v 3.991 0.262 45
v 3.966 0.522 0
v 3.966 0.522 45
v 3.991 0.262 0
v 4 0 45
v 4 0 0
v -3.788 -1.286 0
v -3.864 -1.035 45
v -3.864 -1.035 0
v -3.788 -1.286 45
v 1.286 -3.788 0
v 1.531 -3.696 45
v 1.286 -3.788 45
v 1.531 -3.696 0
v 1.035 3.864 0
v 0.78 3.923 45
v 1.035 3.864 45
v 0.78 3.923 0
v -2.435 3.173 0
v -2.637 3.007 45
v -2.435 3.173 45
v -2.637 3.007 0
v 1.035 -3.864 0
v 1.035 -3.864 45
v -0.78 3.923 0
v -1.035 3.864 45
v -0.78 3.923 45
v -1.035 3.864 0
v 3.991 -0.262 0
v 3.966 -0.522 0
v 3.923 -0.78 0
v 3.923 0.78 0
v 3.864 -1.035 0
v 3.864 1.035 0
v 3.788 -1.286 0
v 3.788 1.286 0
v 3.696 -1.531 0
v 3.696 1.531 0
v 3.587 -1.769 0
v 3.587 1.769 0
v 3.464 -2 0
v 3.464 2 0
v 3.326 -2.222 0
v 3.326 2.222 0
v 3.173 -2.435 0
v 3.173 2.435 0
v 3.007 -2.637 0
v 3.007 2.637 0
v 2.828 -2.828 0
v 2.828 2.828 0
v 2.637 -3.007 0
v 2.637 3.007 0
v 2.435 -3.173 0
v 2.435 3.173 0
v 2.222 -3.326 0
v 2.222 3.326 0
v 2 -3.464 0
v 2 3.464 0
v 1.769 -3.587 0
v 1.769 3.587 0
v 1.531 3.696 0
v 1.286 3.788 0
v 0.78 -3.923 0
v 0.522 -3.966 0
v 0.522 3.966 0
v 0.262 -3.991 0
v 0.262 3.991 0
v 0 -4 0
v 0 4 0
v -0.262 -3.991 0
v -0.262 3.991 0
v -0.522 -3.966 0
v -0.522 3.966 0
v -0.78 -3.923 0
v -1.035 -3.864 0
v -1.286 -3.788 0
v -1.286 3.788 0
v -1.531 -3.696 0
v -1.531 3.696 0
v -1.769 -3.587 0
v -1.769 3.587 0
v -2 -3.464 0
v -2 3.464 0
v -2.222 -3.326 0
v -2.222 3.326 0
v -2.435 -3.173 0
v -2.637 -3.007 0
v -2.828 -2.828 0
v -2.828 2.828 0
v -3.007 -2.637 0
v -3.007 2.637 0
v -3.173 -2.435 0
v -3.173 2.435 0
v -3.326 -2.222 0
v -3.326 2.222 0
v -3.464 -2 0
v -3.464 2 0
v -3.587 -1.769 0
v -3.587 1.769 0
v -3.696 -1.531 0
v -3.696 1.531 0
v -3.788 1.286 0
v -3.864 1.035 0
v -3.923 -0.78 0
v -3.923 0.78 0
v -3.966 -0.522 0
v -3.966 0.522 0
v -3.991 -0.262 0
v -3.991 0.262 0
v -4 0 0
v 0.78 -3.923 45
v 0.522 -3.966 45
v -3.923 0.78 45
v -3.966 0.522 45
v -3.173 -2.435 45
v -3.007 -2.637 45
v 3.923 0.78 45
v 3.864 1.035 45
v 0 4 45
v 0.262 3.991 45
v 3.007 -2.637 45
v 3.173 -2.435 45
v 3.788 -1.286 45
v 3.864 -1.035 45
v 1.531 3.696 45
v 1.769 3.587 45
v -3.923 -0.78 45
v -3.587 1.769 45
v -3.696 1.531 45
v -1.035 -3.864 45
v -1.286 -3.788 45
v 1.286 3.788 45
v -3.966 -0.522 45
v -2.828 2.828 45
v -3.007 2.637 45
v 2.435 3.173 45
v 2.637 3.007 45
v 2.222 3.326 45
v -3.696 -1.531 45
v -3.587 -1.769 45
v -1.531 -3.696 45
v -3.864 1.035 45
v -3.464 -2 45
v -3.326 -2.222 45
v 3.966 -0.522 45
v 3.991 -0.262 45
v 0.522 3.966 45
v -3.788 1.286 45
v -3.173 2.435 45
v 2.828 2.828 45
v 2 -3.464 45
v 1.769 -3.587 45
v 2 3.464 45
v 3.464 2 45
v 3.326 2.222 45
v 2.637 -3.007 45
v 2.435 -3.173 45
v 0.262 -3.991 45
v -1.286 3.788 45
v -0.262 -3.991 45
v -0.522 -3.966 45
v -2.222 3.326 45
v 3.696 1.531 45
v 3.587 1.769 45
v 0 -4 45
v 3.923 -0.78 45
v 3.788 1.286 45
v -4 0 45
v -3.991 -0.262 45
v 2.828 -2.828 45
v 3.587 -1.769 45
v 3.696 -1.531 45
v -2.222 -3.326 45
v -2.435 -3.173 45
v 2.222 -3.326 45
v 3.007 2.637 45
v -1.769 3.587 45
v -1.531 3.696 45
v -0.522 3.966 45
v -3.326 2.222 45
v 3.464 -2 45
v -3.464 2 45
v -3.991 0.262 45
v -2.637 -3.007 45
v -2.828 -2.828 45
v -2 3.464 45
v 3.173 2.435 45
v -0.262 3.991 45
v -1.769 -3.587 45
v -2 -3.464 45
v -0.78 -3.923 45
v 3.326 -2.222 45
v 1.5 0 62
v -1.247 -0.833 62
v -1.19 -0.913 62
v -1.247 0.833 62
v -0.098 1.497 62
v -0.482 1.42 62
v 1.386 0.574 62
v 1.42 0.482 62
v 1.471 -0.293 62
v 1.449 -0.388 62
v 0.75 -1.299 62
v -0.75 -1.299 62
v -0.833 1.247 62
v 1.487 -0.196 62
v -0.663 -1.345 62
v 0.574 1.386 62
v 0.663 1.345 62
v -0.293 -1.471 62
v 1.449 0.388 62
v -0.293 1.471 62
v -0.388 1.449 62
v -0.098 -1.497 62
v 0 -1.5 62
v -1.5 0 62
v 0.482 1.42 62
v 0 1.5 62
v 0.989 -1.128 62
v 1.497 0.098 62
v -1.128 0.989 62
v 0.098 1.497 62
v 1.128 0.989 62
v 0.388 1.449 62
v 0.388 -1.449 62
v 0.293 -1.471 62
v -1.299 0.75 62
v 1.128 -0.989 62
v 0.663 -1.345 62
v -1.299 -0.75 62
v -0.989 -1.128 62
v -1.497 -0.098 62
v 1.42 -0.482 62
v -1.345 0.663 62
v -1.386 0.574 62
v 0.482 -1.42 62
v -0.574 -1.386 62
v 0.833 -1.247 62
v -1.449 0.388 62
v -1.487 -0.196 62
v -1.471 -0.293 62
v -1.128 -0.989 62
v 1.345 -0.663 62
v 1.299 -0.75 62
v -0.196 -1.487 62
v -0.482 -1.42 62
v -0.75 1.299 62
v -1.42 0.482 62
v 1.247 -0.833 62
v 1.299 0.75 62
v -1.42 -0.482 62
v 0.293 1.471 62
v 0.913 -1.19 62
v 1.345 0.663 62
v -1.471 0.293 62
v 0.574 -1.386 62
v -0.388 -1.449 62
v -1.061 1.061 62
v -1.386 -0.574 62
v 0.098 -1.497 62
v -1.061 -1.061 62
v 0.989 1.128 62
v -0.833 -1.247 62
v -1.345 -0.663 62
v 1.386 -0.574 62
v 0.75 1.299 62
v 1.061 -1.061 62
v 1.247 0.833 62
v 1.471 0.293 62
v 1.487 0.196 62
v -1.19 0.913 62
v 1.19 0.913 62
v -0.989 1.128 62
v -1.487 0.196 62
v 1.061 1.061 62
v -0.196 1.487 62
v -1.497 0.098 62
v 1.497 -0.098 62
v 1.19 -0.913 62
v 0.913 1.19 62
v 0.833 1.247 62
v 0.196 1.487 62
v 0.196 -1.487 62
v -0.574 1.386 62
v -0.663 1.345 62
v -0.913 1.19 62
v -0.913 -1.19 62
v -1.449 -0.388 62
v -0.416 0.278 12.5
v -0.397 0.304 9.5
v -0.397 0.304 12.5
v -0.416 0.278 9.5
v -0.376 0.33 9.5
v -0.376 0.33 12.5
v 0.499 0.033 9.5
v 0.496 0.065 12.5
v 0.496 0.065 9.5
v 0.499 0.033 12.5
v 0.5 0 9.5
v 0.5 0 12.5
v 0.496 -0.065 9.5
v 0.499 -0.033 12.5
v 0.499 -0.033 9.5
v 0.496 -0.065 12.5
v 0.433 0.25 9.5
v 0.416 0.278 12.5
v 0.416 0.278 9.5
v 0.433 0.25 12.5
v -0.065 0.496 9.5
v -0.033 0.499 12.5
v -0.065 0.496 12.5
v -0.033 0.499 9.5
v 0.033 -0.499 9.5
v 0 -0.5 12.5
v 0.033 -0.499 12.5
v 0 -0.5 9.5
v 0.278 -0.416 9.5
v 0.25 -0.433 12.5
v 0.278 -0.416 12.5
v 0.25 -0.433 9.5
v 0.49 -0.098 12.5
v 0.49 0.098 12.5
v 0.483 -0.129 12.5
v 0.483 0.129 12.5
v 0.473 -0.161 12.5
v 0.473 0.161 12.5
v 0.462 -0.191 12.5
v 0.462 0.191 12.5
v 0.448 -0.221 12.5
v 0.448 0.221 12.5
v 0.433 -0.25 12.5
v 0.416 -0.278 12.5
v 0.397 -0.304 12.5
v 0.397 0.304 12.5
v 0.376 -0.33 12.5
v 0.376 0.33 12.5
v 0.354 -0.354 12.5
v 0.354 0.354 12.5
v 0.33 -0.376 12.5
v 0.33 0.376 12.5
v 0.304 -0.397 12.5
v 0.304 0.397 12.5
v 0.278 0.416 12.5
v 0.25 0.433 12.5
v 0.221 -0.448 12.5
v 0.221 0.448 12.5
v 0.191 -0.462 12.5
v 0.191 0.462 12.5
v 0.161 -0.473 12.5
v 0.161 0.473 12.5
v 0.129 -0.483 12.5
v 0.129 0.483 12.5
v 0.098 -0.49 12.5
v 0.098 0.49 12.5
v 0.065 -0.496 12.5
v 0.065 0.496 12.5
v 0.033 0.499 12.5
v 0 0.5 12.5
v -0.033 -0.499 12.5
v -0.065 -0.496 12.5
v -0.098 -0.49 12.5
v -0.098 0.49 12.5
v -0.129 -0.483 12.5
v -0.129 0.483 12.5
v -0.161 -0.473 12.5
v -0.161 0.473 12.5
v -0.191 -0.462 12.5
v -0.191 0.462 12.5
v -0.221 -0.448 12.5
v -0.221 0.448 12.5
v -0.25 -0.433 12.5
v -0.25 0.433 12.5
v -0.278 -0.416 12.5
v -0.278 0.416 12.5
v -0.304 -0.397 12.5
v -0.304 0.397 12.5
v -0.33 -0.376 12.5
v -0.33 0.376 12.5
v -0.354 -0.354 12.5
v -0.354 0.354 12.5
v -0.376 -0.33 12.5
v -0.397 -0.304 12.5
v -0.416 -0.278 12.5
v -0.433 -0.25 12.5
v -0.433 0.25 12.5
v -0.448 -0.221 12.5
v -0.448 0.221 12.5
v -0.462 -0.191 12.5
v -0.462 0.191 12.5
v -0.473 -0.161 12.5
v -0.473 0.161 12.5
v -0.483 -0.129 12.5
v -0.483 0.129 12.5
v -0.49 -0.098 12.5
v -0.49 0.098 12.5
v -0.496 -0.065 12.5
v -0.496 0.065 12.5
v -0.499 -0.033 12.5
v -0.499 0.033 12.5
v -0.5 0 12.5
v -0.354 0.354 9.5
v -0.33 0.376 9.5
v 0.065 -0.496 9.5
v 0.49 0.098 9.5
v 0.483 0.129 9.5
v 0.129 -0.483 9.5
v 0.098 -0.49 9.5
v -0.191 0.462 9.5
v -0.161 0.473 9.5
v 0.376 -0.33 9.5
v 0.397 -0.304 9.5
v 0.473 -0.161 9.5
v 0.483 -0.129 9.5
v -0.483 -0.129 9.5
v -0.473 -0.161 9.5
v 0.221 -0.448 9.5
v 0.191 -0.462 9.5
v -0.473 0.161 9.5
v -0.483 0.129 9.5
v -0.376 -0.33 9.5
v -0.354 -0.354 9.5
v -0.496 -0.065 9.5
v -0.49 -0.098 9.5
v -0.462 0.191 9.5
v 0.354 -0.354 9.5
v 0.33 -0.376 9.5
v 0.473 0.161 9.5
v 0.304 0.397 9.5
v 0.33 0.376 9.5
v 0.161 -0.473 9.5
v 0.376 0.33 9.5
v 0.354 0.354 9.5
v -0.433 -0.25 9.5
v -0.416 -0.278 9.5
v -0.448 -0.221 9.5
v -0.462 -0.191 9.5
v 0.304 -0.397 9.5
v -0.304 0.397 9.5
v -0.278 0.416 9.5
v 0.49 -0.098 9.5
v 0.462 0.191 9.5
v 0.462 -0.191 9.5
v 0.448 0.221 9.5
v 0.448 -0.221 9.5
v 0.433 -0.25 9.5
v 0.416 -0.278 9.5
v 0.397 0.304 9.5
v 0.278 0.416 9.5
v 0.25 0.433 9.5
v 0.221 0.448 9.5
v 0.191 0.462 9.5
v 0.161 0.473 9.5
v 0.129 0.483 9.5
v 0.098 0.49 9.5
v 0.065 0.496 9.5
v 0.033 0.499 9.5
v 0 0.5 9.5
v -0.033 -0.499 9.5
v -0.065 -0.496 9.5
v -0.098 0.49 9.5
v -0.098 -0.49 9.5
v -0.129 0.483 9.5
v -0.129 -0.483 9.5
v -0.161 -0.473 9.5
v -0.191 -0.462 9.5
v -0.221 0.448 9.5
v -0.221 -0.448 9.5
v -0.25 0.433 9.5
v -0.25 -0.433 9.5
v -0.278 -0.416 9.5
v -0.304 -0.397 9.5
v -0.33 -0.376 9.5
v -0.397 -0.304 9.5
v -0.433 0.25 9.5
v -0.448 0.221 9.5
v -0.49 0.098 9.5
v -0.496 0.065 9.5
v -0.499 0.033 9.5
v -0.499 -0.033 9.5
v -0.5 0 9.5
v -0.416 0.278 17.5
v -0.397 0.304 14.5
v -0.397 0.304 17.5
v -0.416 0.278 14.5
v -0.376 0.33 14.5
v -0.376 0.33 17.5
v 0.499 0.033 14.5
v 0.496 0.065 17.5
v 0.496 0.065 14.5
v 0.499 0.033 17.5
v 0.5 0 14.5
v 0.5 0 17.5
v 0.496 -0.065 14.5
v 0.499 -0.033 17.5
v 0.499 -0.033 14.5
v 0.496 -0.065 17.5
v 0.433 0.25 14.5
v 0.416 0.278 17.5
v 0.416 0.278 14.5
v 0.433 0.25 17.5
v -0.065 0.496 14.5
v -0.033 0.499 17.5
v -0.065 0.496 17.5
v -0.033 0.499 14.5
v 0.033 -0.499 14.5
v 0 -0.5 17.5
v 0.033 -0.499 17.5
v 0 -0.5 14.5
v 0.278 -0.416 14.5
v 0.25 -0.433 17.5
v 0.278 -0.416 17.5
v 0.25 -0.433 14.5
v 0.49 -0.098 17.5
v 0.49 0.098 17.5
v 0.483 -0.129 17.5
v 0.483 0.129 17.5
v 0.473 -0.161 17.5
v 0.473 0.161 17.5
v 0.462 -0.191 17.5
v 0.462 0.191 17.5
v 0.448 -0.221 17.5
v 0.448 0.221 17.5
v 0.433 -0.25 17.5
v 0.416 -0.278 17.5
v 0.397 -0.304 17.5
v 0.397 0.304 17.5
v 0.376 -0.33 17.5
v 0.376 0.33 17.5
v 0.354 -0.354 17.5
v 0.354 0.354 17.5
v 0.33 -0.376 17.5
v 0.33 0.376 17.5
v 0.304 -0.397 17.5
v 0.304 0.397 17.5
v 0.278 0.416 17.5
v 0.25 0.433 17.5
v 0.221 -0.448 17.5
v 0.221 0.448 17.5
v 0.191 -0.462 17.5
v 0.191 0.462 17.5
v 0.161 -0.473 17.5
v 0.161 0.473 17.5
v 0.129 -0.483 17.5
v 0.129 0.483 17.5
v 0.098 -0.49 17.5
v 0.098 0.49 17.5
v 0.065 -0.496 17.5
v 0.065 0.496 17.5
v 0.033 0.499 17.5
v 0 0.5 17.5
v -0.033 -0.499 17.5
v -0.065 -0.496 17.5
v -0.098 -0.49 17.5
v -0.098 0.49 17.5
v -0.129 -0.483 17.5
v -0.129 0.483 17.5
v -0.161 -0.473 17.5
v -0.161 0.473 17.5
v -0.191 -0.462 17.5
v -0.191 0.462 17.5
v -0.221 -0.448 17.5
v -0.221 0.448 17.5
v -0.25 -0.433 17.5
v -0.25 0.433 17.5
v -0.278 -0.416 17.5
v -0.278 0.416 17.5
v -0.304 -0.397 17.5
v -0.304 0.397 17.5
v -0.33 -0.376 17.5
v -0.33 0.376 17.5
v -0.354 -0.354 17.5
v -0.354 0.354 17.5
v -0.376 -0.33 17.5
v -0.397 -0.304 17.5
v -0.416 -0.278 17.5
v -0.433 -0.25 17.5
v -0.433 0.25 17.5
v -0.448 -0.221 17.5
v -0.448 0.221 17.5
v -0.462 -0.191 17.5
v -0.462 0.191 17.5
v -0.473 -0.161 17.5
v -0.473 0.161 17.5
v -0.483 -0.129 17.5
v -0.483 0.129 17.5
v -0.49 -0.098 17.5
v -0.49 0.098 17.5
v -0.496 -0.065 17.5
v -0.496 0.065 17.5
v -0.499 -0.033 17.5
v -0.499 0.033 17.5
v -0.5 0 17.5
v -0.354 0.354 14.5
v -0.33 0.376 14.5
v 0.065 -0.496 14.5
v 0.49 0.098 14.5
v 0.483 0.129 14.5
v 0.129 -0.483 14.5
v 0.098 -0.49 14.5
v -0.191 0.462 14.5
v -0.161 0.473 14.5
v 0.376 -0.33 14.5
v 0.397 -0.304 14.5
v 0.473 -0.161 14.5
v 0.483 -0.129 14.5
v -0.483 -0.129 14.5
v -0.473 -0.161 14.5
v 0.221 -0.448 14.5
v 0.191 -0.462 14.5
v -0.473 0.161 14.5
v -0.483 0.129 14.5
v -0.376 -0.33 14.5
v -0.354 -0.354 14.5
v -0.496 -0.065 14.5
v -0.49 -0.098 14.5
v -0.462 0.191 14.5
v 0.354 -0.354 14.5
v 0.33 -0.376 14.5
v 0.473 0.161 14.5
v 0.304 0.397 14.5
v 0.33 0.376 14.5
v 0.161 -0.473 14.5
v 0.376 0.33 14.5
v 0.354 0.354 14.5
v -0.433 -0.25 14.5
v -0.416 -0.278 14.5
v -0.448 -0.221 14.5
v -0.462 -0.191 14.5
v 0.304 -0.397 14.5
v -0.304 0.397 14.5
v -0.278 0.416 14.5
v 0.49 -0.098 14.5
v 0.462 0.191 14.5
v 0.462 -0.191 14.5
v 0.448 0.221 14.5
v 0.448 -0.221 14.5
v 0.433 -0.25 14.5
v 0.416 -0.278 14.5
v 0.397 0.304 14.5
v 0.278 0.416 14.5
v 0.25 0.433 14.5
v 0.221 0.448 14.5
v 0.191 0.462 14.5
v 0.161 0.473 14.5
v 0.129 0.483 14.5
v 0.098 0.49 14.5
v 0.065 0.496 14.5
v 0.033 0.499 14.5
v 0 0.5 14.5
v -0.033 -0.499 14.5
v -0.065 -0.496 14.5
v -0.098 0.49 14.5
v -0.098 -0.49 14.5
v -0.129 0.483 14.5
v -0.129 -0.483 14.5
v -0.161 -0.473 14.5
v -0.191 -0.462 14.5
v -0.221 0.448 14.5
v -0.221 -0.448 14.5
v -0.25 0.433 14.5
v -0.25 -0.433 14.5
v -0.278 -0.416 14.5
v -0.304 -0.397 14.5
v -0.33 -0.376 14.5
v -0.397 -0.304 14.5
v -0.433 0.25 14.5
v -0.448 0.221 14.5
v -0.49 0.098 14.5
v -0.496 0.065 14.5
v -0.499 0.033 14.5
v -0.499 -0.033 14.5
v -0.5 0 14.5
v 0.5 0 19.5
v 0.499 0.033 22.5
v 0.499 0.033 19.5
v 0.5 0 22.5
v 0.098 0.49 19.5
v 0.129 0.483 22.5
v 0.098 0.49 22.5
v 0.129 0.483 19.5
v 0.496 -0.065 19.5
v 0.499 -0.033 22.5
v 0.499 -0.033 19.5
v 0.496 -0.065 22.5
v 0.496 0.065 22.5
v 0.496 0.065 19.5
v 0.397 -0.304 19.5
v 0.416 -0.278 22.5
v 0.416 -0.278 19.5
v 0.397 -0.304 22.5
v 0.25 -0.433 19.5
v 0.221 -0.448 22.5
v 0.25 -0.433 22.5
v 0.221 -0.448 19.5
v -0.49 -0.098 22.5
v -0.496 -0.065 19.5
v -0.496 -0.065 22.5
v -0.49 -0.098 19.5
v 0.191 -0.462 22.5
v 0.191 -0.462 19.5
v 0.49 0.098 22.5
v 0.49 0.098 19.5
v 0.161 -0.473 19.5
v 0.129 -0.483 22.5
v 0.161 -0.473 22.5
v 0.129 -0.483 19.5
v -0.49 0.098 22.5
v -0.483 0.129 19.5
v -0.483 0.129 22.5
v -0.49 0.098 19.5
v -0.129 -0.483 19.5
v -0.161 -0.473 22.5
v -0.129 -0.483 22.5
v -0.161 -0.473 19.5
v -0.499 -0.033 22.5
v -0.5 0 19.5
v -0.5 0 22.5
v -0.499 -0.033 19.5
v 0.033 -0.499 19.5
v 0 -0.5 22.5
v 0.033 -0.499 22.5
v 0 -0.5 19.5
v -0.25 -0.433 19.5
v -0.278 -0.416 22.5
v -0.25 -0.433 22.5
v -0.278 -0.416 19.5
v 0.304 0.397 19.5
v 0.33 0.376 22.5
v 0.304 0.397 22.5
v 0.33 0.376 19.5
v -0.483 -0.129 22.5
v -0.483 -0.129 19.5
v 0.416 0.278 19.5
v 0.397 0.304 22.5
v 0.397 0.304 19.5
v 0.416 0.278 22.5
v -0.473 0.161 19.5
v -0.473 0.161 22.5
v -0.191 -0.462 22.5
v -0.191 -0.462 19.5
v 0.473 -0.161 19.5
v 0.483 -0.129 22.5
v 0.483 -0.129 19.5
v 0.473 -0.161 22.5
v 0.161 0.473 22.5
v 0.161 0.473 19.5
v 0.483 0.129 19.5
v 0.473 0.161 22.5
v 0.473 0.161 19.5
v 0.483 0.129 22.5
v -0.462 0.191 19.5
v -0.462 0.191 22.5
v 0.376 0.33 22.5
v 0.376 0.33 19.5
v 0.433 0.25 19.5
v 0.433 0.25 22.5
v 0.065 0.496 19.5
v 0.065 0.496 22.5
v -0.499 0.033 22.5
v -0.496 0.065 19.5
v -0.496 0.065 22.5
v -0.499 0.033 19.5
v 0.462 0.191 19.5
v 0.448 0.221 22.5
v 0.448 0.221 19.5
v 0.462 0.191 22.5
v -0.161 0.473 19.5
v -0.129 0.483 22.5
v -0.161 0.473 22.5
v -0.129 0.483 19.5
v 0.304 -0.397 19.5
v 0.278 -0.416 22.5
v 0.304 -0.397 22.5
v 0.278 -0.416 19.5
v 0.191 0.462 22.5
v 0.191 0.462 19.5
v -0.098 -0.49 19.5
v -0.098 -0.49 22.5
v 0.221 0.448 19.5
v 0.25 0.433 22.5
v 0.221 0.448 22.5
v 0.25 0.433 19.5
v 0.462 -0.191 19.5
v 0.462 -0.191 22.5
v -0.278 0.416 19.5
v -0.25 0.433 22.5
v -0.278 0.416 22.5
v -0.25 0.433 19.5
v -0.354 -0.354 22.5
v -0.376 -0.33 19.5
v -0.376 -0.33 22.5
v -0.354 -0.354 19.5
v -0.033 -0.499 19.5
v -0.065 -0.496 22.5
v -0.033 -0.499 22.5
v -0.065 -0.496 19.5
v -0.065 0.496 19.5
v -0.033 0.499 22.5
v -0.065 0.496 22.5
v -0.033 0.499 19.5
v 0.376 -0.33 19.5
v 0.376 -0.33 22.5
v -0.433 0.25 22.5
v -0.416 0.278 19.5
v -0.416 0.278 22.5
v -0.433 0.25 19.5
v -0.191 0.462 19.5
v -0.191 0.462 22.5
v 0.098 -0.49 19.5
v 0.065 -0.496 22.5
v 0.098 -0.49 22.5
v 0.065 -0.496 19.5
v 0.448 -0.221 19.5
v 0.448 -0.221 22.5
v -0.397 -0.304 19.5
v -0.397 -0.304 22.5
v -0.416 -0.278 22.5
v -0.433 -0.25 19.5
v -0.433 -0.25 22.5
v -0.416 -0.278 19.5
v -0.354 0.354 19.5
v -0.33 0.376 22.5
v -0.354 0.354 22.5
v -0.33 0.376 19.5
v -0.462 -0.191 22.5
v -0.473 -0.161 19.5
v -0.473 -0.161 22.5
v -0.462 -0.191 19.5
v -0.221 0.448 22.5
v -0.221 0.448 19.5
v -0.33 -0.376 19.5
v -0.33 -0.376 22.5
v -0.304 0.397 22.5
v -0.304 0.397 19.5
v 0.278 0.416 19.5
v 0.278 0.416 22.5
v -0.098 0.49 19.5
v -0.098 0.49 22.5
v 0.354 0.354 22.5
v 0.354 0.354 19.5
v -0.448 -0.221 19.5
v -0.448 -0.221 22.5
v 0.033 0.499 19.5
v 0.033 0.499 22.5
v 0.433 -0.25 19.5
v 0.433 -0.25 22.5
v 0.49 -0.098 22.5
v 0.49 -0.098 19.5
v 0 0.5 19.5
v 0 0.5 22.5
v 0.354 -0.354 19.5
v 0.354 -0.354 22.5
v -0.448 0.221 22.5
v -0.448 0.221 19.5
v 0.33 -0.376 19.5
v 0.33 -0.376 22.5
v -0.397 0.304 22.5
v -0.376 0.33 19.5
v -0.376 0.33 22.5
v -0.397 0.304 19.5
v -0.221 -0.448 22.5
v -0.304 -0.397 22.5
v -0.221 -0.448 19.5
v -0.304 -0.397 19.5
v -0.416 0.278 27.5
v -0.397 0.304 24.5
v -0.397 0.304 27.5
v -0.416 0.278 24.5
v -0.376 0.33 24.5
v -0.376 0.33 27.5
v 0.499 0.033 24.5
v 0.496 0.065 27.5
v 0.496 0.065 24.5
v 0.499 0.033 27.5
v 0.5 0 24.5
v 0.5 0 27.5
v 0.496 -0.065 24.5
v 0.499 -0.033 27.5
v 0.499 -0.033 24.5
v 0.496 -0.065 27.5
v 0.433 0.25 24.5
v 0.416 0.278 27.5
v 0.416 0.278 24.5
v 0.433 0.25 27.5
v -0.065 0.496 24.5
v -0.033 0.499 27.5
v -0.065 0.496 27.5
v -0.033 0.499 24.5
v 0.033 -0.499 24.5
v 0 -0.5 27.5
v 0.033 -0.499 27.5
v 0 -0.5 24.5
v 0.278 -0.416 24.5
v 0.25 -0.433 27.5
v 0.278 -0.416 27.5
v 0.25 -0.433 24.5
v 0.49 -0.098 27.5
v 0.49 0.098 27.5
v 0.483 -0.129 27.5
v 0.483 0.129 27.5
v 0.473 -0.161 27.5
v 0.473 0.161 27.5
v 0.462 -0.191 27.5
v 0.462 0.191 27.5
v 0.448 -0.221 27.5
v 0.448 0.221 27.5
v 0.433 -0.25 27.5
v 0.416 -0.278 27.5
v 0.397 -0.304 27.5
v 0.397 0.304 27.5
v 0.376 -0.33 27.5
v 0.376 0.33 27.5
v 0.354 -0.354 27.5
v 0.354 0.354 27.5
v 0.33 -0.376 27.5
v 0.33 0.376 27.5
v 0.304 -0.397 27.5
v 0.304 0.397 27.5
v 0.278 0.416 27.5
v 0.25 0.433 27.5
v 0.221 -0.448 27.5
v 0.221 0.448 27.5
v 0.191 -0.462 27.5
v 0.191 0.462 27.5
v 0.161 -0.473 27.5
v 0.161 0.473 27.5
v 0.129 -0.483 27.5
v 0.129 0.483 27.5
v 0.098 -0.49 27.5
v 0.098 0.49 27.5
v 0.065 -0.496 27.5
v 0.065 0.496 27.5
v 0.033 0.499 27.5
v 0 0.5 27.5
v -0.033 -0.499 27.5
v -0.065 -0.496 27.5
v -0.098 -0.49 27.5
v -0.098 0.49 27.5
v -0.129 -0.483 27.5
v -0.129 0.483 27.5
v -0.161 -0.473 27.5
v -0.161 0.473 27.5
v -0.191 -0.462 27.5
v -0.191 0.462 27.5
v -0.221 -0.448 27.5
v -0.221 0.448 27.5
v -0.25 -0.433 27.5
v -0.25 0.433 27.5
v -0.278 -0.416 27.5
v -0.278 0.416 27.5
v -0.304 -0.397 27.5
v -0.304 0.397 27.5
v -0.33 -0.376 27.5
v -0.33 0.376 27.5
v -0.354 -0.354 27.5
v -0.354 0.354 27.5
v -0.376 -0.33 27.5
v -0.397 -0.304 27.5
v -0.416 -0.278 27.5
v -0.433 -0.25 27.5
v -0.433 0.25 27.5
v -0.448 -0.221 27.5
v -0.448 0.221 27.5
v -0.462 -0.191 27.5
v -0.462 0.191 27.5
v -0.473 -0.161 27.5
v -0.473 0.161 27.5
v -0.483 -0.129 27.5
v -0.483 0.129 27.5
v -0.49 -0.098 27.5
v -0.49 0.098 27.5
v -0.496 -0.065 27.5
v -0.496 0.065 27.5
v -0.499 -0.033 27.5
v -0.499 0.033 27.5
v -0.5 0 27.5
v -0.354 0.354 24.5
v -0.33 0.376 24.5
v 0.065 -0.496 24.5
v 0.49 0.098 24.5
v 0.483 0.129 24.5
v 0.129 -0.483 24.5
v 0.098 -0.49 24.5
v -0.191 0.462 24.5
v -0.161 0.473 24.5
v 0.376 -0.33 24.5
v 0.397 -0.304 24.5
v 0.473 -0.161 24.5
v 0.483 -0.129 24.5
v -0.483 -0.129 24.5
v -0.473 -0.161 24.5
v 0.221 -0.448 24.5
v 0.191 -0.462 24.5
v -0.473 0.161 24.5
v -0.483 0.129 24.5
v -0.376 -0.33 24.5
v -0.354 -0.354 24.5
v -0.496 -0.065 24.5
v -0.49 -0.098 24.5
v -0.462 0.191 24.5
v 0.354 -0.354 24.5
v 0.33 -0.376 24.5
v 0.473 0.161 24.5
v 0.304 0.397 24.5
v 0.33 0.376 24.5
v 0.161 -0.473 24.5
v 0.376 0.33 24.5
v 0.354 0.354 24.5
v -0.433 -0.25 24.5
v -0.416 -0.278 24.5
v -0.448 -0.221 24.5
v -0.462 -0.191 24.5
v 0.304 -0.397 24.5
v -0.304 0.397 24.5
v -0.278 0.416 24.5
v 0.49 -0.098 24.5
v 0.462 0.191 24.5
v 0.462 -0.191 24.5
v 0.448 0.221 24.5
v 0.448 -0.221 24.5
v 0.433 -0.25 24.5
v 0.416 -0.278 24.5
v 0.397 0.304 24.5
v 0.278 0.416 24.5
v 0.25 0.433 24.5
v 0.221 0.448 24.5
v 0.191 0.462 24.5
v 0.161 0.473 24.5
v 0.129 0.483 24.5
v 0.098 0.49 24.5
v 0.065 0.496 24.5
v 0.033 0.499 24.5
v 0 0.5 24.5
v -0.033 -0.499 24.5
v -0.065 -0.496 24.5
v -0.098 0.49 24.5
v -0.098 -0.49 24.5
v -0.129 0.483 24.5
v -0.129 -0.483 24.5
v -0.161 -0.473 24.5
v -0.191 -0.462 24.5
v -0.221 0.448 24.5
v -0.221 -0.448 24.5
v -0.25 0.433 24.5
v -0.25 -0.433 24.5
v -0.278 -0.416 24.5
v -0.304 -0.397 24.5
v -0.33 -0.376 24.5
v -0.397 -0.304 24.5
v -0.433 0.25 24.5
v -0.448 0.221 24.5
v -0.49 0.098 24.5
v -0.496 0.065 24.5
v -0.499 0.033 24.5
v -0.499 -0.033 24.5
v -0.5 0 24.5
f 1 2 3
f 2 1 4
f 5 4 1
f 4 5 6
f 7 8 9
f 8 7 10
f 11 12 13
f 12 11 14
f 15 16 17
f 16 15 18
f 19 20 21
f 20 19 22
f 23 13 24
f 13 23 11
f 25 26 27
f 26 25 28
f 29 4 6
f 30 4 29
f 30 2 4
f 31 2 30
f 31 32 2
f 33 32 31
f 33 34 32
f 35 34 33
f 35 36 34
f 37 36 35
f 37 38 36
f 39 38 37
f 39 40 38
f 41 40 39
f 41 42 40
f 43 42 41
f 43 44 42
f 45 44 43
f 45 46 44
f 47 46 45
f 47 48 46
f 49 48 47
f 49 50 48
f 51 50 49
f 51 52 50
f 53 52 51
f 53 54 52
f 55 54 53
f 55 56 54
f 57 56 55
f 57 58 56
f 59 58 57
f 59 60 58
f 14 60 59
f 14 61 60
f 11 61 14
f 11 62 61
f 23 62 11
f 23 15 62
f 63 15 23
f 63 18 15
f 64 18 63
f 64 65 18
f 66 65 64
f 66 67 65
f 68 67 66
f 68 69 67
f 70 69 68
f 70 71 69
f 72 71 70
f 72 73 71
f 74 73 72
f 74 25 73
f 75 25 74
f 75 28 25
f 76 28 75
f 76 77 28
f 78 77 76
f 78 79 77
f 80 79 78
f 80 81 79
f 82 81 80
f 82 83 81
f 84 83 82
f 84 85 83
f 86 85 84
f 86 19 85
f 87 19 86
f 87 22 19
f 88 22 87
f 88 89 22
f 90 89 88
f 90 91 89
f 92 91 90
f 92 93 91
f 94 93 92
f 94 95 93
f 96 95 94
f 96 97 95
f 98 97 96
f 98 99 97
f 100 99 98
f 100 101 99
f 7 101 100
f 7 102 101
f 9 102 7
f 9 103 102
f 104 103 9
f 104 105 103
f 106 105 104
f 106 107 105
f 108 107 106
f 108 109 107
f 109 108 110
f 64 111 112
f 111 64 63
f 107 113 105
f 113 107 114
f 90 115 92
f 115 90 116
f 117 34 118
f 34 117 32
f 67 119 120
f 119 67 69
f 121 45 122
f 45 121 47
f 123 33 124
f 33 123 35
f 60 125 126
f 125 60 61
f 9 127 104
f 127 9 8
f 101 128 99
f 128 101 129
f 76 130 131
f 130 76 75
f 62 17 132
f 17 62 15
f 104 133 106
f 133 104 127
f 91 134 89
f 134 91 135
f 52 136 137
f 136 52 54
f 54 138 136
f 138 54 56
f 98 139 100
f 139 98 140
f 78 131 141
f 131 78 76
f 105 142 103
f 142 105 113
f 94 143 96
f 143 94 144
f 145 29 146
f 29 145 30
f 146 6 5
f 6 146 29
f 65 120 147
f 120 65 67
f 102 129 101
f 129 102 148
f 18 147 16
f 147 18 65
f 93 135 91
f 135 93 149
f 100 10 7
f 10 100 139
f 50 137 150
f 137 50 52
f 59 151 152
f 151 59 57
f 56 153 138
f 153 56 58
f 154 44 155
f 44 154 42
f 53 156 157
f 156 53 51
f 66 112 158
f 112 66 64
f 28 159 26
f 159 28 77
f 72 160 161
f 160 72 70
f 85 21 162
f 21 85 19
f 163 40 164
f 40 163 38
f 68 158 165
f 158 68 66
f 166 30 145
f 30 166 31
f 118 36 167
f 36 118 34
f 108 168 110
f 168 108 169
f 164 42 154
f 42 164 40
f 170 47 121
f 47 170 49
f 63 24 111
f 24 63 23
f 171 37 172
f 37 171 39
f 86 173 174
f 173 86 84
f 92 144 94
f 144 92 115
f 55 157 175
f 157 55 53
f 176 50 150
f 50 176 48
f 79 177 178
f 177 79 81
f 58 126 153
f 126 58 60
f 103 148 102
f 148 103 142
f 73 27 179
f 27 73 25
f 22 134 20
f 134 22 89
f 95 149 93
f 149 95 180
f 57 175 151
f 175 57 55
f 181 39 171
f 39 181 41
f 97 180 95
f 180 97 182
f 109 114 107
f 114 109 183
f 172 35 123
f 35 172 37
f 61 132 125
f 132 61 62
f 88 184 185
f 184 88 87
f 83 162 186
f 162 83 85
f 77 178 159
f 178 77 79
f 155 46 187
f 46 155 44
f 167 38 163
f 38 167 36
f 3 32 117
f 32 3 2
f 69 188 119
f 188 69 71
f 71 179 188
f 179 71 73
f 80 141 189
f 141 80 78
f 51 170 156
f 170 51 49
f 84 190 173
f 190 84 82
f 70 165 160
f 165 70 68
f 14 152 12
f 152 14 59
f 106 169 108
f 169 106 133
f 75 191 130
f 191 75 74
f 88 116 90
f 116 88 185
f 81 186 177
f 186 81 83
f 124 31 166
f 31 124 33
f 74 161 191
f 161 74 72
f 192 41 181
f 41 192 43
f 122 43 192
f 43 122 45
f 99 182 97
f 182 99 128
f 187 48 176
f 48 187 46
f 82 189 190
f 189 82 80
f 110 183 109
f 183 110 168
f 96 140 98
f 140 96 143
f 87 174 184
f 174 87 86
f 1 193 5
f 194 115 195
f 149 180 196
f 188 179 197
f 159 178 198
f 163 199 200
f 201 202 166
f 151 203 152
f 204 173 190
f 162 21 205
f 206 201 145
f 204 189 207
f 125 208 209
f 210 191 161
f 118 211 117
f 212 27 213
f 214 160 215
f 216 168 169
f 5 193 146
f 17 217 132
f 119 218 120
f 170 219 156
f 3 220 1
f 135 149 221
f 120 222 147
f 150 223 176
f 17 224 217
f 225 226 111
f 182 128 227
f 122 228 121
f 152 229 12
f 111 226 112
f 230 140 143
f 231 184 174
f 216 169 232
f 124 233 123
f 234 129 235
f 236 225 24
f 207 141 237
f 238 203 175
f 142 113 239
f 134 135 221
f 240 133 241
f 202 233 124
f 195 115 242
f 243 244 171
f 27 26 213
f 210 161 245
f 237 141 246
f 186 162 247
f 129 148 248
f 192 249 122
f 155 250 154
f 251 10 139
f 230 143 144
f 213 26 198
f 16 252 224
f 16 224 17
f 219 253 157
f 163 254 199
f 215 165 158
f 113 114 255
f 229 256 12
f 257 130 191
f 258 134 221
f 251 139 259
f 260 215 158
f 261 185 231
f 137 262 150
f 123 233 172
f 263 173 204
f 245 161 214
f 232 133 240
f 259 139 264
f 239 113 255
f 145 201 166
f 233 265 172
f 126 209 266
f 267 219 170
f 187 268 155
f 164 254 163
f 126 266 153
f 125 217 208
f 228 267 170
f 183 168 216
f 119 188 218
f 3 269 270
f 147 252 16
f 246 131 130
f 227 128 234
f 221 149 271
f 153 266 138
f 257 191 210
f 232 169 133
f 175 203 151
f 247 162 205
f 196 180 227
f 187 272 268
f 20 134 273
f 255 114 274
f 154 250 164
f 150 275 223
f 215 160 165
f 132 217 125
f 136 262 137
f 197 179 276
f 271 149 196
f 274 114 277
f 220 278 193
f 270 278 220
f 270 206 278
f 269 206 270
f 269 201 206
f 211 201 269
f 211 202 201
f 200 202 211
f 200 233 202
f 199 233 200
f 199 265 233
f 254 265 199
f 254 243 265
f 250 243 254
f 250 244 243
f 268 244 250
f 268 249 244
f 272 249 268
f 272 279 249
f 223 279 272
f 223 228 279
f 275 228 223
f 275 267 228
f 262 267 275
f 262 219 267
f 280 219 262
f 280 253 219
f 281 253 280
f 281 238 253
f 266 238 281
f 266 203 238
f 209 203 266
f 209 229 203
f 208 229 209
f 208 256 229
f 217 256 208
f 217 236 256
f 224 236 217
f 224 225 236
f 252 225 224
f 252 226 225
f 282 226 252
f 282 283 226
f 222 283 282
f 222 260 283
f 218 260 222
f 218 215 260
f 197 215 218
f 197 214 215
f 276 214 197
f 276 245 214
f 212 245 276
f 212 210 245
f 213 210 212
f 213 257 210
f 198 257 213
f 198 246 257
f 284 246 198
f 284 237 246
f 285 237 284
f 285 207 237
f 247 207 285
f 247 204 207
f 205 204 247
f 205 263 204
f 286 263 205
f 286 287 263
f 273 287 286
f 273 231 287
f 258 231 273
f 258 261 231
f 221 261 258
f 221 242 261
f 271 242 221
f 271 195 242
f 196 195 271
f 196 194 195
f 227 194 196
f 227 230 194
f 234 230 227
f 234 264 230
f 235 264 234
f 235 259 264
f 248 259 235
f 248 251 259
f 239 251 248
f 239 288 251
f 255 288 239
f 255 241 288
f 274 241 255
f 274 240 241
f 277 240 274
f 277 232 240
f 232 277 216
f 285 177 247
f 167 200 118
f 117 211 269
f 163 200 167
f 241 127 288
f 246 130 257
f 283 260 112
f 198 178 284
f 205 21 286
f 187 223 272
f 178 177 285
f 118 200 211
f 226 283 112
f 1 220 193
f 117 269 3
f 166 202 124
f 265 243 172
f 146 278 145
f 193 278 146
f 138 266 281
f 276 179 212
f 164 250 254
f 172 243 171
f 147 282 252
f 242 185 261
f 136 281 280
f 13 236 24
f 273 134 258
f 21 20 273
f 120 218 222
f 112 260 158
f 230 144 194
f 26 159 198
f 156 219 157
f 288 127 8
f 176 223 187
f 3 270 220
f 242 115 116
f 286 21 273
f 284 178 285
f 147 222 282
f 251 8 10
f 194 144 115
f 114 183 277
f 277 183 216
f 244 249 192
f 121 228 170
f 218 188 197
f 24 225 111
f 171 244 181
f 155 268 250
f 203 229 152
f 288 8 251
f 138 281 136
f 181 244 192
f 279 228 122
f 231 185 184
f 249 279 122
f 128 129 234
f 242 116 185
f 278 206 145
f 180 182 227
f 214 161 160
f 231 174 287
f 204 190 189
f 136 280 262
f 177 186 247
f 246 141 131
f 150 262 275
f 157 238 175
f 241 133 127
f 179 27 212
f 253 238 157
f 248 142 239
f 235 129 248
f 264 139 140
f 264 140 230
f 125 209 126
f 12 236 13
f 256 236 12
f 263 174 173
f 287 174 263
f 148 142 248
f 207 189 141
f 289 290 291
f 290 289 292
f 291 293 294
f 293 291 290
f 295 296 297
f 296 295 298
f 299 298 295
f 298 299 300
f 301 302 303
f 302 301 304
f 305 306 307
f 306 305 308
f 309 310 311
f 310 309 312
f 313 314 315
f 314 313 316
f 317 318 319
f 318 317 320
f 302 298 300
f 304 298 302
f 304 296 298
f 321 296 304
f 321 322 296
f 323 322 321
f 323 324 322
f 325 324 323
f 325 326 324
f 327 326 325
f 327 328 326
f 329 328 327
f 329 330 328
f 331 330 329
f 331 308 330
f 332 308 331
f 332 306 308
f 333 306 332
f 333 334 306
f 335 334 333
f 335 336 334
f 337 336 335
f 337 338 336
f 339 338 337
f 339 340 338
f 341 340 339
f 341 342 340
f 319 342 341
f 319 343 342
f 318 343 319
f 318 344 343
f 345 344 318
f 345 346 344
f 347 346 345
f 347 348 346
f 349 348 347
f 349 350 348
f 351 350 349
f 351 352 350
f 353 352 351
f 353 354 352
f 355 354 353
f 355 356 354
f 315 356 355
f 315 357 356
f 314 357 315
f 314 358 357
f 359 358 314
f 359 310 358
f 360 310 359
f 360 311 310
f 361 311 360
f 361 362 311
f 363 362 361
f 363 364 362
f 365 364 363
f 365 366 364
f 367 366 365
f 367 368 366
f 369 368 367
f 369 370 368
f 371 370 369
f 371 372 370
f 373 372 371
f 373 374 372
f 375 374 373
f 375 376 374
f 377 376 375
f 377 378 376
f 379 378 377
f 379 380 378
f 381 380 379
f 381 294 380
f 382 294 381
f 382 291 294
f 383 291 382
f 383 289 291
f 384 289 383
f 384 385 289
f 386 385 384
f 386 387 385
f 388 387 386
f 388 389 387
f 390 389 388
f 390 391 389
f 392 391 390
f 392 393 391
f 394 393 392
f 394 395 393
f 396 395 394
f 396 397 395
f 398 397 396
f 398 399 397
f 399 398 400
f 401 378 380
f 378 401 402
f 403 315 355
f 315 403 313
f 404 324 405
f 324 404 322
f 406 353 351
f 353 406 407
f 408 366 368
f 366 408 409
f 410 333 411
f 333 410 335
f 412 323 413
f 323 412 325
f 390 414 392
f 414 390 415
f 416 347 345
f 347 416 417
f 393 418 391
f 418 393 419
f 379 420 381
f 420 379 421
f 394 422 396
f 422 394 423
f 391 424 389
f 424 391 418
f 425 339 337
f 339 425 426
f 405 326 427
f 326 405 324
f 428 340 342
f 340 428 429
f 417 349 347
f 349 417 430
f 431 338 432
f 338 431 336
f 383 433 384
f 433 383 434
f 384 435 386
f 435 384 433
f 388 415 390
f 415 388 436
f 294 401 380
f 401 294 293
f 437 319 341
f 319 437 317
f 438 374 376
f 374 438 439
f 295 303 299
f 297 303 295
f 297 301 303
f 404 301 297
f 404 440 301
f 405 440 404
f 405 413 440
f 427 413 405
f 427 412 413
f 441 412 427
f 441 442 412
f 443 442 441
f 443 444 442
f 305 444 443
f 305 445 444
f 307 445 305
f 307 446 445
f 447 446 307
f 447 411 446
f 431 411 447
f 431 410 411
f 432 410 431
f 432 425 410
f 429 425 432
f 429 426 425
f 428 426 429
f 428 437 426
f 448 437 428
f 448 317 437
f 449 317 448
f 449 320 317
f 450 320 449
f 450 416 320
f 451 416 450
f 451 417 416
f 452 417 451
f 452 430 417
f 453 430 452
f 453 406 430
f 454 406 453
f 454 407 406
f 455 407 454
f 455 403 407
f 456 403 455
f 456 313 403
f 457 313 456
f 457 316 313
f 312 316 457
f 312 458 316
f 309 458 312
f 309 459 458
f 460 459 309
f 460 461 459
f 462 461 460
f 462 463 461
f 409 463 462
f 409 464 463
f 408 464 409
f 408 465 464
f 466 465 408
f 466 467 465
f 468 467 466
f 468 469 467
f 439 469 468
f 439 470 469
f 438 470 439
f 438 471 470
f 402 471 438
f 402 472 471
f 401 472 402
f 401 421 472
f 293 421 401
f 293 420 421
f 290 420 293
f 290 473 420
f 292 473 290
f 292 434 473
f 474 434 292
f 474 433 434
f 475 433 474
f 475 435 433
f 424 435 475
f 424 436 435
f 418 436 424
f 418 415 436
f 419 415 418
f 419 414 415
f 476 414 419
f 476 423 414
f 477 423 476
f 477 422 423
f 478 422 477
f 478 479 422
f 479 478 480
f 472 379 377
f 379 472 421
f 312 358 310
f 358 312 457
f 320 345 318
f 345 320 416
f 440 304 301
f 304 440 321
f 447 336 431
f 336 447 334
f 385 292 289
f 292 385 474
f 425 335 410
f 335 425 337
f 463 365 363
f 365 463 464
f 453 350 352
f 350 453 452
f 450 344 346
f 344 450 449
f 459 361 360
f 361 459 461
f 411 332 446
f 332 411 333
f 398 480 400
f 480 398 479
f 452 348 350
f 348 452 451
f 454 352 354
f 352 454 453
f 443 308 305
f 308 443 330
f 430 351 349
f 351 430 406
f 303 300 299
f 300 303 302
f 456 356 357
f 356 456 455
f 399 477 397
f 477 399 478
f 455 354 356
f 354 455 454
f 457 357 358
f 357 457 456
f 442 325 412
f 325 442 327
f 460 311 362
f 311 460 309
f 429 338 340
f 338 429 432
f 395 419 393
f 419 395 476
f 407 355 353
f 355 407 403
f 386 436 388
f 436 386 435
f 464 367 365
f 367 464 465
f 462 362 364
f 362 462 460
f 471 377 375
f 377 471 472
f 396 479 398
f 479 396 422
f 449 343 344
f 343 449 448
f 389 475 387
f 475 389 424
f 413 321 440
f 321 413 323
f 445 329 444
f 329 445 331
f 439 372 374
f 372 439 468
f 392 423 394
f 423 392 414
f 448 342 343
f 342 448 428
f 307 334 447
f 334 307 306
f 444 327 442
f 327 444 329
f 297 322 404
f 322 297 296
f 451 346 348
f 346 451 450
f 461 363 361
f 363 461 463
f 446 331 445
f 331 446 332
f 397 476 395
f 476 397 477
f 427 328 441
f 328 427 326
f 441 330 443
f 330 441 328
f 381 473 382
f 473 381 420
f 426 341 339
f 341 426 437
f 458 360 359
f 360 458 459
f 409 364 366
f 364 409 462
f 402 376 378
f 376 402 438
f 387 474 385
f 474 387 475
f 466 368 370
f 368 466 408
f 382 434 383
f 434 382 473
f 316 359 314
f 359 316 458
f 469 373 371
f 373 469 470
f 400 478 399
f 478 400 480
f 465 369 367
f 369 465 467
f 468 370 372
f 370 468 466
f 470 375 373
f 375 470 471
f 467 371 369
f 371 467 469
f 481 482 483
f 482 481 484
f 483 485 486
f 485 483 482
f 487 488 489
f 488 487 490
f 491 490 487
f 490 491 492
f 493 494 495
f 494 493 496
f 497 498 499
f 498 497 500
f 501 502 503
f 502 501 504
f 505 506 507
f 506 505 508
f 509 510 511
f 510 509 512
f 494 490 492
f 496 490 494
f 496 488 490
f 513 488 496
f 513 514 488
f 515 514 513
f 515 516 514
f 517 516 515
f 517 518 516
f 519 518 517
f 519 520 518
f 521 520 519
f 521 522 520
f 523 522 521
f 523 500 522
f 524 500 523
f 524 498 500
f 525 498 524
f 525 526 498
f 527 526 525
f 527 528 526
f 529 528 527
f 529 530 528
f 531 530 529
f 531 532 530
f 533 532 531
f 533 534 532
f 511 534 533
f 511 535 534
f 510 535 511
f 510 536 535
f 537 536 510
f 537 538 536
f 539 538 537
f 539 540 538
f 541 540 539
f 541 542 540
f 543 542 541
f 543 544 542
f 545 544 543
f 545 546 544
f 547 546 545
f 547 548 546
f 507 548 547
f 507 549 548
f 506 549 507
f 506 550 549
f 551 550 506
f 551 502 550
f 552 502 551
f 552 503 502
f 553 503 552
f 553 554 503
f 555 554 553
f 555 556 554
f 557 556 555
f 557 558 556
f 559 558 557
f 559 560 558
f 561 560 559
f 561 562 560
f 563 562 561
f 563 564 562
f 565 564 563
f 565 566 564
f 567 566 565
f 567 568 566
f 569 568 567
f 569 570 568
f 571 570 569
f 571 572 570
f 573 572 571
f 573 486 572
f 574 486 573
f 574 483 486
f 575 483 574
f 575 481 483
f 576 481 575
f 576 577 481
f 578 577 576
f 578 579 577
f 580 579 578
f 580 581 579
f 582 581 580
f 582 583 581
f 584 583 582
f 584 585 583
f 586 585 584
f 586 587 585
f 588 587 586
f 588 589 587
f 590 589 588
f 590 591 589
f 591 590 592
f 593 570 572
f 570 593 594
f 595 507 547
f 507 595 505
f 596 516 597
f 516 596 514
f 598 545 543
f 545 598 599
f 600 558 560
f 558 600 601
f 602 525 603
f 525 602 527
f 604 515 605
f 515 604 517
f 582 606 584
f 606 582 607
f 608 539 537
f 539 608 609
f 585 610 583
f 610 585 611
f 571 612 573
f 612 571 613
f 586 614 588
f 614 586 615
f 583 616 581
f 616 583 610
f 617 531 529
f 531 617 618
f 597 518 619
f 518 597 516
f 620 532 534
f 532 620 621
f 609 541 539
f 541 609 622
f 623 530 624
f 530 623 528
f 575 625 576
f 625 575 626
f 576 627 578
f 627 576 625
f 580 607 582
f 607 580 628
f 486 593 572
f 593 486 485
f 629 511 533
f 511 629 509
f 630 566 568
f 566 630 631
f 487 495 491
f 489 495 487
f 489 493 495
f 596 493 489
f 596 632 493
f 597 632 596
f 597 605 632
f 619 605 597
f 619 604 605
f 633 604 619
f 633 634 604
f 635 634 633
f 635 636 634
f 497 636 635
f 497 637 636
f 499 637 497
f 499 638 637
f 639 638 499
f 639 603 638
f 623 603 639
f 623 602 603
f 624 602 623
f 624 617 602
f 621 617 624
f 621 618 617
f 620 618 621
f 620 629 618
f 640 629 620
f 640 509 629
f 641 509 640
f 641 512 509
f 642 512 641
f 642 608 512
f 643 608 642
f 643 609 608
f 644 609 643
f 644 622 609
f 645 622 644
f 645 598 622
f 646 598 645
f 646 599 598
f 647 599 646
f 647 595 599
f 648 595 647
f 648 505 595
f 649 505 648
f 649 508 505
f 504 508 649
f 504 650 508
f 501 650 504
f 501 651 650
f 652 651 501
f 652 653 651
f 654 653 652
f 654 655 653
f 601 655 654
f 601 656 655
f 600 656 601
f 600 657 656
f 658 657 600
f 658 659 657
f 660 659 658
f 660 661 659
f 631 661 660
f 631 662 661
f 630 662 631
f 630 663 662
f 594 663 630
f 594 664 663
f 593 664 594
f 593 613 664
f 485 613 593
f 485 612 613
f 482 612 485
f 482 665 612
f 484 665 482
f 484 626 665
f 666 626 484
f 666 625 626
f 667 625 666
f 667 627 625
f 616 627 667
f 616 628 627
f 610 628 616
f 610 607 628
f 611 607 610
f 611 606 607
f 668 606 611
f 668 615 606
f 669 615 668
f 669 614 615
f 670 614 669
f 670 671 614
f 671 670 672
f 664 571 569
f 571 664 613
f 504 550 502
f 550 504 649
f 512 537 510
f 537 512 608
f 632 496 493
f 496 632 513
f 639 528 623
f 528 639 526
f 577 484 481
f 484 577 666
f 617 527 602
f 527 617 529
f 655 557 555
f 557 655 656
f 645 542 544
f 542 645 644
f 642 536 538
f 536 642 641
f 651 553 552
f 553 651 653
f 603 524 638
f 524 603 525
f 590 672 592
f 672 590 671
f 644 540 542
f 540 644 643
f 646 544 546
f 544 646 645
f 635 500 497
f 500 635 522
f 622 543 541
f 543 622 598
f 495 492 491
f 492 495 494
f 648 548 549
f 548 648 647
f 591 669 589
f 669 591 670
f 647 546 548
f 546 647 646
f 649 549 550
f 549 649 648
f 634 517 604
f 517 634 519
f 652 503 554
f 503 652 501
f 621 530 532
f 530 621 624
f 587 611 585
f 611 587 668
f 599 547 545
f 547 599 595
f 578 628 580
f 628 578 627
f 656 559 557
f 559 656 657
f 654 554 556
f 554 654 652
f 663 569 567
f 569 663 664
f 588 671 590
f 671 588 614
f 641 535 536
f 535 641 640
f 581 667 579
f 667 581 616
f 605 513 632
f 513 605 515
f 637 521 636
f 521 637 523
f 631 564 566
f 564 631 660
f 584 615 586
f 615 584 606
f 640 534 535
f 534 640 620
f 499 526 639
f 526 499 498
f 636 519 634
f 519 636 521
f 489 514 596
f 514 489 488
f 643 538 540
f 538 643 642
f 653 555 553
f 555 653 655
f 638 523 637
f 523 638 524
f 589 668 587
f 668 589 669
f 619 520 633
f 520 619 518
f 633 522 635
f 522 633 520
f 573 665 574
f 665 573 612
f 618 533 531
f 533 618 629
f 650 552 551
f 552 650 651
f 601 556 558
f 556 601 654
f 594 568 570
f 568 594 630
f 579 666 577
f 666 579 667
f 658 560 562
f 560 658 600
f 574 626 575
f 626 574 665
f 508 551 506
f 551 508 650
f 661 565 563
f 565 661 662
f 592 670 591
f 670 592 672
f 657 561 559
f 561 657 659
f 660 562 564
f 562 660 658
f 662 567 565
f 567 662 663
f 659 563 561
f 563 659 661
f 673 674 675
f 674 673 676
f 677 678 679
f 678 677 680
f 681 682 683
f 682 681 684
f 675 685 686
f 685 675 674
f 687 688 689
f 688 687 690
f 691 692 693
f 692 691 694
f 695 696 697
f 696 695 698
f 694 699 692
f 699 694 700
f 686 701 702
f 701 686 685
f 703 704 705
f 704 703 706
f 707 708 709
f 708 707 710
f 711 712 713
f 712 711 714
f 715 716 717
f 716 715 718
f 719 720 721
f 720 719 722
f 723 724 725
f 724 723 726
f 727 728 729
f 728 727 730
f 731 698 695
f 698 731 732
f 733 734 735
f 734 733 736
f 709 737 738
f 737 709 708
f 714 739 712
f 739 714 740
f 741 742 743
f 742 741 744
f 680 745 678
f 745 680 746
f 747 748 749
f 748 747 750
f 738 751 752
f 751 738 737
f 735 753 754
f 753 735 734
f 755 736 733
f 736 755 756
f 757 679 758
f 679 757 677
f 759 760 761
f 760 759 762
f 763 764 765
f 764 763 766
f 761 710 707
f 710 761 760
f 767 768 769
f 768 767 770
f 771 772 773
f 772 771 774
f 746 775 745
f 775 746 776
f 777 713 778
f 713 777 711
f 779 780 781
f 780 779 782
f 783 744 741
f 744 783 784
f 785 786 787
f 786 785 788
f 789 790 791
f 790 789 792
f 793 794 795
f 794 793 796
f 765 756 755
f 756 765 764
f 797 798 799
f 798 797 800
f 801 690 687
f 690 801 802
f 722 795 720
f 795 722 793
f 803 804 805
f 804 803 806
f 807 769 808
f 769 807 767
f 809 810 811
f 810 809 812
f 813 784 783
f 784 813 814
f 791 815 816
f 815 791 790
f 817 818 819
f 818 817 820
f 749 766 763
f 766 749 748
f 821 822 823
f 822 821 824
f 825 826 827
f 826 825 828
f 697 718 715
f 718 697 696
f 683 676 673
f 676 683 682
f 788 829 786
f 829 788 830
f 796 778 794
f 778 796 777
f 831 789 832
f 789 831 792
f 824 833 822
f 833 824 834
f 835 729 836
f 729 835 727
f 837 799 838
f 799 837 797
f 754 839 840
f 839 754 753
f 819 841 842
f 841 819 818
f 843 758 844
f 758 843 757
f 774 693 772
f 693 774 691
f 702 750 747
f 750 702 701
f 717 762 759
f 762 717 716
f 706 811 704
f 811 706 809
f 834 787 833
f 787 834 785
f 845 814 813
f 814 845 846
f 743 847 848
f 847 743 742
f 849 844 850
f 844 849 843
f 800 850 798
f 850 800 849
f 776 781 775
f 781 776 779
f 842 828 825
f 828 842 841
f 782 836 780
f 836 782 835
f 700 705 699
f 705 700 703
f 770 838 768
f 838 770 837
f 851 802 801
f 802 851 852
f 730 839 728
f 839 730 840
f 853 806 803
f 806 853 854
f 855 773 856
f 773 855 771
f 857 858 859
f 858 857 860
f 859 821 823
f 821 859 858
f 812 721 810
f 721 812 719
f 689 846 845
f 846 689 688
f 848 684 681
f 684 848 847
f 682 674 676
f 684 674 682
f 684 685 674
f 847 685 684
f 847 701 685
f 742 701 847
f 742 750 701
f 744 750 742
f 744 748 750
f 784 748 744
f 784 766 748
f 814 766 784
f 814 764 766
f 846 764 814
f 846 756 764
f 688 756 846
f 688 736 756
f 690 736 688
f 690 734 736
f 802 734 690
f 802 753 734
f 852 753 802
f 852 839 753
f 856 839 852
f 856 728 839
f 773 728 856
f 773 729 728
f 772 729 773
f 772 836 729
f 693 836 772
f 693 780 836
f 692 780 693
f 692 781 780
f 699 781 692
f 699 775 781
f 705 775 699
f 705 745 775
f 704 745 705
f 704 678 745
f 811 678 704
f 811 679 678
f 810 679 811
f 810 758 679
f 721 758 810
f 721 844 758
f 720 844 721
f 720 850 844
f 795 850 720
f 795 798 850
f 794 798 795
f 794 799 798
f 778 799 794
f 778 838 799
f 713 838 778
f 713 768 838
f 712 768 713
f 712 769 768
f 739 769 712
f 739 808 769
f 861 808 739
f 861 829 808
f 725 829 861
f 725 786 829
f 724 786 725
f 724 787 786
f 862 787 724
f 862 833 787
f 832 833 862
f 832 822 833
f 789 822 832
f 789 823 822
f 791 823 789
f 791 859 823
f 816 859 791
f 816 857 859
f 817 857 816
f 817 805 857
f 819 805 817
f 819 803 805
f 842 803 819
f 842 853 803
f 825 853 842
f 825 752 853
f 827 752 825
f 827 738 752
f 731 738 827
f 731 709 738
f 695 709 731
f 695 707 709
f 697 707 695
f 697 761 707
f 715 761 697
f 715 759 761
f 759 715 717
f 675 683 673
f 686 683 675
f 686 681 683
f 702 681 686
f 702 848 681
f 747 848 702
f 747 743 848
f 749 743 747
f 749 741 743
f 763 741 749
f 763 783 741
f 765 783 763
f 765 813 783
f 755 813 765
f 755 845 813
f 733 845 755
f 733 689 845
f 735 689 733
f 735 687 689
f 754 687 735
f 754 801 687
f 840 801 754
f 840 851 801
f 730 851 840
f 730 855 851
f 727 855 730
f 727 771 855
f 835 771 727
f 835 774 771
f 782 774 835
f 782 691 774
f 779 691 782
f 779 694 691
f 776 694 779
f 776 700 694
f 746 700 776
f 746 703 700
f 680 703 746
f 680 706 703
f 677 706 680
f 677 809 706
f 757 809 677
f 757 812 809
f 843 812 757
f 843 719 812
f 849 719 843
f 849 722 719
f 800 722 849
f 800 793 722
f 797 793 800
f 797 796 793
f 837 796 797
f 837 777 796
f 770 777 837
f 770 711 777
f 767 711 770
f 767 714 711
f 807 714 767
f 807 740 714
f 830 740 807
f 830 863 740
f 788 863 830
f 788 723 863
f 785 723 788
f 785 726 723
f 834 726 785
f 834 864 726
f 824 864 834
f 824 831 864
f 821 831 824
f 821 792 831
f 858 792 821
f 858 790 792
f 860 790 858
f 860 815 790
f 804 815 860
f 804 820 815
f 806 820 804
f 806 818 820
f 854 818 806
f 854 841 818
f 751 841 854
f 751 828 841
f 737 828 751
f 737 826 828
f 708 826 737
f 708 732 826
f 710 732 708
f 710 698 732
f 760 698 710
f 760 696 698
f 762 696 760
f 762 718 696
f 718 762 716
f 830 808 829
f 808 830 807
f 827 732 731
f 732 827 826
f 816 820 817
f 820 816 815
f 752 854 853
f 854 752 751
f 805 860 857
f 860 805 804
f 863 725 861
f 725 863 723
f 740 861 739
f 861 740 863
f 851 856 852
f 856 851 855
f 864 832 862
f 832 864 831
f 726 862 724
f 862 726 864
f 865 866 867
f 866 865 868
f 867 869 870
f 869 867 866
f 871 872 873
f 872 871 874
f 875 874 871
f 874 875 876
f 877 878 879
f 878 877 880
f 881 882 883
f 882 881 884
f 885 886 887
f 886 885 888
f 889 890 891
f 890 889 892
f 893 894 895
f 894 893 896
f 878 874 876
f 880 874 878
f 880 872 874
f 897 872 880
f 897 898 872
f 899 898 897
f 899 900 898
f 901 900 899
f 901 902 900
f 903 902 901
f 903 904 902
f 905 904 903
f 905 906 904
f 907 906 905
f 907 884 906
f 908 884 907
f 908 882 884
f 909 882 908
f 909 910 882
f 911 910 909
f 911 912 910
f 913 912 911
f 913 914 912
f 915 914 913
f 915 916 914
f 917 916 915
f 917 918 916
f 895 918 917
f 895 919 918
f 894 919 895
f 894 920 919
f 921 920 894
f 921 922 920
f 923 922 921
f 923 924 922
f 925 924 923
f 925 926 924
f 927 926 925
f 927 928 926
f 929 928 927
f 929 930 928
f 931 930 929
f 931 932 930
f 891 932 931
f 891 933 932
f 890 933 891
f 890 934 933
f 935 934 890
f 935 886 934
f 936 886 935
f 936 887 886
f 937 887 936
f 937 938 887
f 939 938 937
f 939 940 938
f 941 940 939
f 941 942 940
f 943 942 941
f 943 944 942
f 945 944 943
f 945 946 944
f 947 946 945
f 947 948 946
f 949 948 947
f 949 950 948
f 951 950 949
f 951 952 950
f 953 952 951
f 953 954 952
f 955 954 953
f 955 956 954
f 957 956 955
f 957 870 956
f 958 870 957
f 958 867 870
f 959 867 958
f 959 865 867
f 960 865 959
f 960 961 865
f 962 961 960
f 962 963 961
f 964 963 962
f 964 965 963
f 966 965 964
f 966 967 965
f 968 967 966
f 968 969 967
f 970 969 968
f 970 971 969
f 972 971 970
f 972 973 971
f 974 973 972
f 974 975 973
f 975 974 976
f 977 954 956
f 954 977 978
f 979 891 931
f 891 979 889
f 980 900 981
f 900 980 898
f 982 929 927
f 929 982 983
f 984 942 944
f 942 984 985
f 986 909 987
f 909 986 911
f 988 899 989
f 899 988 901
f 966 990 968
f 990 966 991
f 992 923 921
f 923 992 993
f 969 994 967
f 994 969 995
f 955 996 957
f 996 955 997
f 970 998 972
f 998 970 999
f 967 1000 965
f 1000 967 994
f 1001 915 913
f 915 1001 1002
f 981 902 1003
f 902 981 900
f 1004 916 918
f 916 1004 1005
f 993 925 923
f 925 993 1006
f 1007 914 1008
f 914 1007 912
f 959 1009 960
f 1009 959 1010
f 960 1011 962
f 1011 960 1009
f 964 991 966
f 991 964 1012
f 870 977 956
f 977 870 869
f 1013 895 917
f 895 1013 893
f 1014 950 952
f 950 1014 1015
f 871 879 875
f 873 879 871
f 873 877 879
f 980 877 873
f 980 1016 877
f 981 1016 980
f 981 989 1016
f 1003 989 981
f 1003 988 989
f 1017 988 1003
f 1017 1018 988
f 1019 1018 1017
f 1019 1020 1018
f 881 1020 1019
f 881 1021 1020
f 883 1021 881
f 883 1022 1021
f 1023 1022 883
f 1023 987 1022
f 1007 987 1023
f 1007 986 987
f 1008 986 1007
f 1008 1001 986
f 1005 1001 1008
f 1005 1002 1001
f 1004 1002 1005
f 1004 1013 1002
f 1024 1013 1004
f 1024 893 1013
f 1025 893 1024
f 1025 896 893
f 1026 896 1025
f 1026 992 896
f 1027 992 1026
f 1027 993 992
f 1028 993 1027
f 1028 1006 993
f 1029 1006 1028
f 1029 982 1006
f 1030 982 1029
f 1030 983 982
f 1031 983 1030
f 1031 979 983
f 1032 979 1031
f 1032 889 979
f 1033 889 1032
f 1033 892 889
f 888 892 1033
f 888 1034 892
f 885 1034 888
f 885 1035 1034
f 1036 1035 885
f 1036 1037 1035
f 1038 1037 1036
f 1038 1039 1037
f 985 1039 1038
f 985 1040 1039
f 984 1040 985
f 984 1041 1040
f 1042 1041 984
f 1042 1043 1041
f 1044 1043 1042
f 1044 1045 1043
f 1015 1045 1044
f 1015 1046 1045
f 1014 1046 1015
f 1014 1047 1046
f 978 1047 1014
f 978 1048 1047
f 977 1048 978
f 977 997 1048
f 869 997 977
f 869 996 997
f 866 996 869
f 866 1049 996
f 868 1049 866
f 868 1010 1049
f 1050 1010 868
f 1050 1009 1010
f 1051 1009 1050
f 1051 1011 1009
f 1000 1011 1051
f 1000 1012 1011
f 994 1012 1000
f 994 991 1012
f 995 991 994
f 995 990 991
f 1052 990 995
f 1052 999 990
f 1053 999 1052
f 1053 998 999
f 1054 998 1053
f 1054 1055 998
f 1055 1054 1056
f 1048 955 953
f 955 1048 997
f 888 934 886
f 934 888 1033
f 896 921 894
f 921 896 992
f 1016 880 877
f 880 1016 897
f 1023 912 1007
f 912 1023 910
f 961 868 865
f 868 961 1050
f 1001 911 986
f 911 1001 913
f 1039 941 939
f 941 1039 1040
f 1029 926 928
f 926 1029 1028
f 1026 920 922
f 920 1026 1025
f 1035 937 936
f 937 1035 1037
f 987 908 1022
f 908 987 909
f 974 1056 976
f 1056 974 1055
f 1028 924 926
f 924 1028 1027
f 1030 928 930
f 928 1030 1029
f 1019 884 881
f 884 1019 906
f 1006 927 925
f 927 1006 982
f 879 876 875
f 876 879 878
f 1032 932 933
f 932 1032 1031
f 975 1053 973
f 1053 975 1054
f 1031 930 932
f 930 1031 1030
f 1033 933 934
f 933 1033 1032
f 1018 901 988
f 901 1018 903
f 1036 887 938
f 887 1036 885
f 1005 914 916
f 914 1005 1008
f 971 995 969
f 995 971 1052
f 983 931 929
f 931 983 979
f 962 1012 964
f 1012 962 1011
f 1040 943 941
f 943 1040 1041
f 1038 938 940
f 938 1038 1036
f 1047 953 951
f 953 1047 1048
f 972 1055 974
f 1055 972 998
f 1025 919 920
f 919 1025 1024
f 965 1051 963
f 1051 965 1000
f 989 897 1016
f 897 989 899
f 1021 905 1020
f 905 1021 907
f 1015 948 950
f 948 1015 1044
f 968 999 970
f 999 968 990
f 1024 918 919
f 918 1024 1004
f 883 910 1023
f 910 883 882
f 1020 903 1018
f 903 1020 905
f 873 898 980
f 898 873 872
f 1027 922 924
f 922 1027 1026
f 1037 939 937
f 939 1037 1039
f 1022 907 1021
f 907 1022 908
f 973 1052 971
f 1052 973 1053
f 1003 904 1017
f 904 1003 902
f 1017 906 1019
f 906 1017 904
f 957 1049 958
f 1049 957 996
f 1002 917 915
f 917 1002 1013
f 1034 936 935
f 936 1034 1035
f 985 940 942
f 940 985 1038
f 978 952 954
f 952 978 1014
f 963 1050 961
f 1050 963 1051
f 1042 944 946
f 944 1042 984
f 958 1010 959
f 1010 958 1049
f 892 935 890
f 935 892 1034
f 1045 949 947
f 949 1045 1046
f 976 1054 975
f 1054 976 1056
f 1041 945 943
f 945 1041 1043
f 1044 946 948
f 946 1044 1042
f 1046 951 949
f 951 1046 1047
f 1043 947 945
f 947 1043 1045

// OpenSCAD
// Pestle for 1.5 mL microcentrifuge tube
// Print orientation: standing upright on the bed (z = 0)

// ---------------- Parameters ----------------
handle_d      = 8;    // handle diameter (mm)
handle_h      = 45;   // handle height (mm), z = 0 to 45

cone_top_d    = 8;    // cone diameter at handle junction (mm)
cone_bottom_d = 3;    // cone diameter at tip top (mm)
cone_h        = 17;   // cone height (mm), z = 45 to 62

tip_r         = 3;    // rounded tip radius (mm), centred at z = 62
tip_h         = 6;    // tip height above centre (mm)

groove_count  = 4;    // number of circumferential grooves
groove_w      = 2;    // groove width (mm), in Z
groove_depth  = 1;    // groove depth (mm)
groove_z      = [10, 15, 20, 25]; // groove centre heights (mm)

eps           = 0.5;  // overshoot for clean cuts (mm)

$fn = 96;             // curve resolution

// ---------------- Model ----------------
difference() {
    union() {
        // Handle
        cylinder(d = handle_d, h = handle_h);

        // Cone: from handle diameter down to tip top diameter
        translate([0, 0, handle_h])
            cylinder(d1 = cone_top_d, d2 = cone_bottom_d, h = cone_h);

        // Rounded tip: sphere centred at z = 62
        translate([0, 0, tip_h])
            sphere(r = tip_r);
    }

    // Grooves cut into the handle, extended past the faces they span
    for (i = [0 : groove_count - 1]) {
        z = groove_z[i];
        translate([0, 0, z - eps])
            cylinder(d = groove_depth, h = groove_w + 2 * eps);
    }
}
